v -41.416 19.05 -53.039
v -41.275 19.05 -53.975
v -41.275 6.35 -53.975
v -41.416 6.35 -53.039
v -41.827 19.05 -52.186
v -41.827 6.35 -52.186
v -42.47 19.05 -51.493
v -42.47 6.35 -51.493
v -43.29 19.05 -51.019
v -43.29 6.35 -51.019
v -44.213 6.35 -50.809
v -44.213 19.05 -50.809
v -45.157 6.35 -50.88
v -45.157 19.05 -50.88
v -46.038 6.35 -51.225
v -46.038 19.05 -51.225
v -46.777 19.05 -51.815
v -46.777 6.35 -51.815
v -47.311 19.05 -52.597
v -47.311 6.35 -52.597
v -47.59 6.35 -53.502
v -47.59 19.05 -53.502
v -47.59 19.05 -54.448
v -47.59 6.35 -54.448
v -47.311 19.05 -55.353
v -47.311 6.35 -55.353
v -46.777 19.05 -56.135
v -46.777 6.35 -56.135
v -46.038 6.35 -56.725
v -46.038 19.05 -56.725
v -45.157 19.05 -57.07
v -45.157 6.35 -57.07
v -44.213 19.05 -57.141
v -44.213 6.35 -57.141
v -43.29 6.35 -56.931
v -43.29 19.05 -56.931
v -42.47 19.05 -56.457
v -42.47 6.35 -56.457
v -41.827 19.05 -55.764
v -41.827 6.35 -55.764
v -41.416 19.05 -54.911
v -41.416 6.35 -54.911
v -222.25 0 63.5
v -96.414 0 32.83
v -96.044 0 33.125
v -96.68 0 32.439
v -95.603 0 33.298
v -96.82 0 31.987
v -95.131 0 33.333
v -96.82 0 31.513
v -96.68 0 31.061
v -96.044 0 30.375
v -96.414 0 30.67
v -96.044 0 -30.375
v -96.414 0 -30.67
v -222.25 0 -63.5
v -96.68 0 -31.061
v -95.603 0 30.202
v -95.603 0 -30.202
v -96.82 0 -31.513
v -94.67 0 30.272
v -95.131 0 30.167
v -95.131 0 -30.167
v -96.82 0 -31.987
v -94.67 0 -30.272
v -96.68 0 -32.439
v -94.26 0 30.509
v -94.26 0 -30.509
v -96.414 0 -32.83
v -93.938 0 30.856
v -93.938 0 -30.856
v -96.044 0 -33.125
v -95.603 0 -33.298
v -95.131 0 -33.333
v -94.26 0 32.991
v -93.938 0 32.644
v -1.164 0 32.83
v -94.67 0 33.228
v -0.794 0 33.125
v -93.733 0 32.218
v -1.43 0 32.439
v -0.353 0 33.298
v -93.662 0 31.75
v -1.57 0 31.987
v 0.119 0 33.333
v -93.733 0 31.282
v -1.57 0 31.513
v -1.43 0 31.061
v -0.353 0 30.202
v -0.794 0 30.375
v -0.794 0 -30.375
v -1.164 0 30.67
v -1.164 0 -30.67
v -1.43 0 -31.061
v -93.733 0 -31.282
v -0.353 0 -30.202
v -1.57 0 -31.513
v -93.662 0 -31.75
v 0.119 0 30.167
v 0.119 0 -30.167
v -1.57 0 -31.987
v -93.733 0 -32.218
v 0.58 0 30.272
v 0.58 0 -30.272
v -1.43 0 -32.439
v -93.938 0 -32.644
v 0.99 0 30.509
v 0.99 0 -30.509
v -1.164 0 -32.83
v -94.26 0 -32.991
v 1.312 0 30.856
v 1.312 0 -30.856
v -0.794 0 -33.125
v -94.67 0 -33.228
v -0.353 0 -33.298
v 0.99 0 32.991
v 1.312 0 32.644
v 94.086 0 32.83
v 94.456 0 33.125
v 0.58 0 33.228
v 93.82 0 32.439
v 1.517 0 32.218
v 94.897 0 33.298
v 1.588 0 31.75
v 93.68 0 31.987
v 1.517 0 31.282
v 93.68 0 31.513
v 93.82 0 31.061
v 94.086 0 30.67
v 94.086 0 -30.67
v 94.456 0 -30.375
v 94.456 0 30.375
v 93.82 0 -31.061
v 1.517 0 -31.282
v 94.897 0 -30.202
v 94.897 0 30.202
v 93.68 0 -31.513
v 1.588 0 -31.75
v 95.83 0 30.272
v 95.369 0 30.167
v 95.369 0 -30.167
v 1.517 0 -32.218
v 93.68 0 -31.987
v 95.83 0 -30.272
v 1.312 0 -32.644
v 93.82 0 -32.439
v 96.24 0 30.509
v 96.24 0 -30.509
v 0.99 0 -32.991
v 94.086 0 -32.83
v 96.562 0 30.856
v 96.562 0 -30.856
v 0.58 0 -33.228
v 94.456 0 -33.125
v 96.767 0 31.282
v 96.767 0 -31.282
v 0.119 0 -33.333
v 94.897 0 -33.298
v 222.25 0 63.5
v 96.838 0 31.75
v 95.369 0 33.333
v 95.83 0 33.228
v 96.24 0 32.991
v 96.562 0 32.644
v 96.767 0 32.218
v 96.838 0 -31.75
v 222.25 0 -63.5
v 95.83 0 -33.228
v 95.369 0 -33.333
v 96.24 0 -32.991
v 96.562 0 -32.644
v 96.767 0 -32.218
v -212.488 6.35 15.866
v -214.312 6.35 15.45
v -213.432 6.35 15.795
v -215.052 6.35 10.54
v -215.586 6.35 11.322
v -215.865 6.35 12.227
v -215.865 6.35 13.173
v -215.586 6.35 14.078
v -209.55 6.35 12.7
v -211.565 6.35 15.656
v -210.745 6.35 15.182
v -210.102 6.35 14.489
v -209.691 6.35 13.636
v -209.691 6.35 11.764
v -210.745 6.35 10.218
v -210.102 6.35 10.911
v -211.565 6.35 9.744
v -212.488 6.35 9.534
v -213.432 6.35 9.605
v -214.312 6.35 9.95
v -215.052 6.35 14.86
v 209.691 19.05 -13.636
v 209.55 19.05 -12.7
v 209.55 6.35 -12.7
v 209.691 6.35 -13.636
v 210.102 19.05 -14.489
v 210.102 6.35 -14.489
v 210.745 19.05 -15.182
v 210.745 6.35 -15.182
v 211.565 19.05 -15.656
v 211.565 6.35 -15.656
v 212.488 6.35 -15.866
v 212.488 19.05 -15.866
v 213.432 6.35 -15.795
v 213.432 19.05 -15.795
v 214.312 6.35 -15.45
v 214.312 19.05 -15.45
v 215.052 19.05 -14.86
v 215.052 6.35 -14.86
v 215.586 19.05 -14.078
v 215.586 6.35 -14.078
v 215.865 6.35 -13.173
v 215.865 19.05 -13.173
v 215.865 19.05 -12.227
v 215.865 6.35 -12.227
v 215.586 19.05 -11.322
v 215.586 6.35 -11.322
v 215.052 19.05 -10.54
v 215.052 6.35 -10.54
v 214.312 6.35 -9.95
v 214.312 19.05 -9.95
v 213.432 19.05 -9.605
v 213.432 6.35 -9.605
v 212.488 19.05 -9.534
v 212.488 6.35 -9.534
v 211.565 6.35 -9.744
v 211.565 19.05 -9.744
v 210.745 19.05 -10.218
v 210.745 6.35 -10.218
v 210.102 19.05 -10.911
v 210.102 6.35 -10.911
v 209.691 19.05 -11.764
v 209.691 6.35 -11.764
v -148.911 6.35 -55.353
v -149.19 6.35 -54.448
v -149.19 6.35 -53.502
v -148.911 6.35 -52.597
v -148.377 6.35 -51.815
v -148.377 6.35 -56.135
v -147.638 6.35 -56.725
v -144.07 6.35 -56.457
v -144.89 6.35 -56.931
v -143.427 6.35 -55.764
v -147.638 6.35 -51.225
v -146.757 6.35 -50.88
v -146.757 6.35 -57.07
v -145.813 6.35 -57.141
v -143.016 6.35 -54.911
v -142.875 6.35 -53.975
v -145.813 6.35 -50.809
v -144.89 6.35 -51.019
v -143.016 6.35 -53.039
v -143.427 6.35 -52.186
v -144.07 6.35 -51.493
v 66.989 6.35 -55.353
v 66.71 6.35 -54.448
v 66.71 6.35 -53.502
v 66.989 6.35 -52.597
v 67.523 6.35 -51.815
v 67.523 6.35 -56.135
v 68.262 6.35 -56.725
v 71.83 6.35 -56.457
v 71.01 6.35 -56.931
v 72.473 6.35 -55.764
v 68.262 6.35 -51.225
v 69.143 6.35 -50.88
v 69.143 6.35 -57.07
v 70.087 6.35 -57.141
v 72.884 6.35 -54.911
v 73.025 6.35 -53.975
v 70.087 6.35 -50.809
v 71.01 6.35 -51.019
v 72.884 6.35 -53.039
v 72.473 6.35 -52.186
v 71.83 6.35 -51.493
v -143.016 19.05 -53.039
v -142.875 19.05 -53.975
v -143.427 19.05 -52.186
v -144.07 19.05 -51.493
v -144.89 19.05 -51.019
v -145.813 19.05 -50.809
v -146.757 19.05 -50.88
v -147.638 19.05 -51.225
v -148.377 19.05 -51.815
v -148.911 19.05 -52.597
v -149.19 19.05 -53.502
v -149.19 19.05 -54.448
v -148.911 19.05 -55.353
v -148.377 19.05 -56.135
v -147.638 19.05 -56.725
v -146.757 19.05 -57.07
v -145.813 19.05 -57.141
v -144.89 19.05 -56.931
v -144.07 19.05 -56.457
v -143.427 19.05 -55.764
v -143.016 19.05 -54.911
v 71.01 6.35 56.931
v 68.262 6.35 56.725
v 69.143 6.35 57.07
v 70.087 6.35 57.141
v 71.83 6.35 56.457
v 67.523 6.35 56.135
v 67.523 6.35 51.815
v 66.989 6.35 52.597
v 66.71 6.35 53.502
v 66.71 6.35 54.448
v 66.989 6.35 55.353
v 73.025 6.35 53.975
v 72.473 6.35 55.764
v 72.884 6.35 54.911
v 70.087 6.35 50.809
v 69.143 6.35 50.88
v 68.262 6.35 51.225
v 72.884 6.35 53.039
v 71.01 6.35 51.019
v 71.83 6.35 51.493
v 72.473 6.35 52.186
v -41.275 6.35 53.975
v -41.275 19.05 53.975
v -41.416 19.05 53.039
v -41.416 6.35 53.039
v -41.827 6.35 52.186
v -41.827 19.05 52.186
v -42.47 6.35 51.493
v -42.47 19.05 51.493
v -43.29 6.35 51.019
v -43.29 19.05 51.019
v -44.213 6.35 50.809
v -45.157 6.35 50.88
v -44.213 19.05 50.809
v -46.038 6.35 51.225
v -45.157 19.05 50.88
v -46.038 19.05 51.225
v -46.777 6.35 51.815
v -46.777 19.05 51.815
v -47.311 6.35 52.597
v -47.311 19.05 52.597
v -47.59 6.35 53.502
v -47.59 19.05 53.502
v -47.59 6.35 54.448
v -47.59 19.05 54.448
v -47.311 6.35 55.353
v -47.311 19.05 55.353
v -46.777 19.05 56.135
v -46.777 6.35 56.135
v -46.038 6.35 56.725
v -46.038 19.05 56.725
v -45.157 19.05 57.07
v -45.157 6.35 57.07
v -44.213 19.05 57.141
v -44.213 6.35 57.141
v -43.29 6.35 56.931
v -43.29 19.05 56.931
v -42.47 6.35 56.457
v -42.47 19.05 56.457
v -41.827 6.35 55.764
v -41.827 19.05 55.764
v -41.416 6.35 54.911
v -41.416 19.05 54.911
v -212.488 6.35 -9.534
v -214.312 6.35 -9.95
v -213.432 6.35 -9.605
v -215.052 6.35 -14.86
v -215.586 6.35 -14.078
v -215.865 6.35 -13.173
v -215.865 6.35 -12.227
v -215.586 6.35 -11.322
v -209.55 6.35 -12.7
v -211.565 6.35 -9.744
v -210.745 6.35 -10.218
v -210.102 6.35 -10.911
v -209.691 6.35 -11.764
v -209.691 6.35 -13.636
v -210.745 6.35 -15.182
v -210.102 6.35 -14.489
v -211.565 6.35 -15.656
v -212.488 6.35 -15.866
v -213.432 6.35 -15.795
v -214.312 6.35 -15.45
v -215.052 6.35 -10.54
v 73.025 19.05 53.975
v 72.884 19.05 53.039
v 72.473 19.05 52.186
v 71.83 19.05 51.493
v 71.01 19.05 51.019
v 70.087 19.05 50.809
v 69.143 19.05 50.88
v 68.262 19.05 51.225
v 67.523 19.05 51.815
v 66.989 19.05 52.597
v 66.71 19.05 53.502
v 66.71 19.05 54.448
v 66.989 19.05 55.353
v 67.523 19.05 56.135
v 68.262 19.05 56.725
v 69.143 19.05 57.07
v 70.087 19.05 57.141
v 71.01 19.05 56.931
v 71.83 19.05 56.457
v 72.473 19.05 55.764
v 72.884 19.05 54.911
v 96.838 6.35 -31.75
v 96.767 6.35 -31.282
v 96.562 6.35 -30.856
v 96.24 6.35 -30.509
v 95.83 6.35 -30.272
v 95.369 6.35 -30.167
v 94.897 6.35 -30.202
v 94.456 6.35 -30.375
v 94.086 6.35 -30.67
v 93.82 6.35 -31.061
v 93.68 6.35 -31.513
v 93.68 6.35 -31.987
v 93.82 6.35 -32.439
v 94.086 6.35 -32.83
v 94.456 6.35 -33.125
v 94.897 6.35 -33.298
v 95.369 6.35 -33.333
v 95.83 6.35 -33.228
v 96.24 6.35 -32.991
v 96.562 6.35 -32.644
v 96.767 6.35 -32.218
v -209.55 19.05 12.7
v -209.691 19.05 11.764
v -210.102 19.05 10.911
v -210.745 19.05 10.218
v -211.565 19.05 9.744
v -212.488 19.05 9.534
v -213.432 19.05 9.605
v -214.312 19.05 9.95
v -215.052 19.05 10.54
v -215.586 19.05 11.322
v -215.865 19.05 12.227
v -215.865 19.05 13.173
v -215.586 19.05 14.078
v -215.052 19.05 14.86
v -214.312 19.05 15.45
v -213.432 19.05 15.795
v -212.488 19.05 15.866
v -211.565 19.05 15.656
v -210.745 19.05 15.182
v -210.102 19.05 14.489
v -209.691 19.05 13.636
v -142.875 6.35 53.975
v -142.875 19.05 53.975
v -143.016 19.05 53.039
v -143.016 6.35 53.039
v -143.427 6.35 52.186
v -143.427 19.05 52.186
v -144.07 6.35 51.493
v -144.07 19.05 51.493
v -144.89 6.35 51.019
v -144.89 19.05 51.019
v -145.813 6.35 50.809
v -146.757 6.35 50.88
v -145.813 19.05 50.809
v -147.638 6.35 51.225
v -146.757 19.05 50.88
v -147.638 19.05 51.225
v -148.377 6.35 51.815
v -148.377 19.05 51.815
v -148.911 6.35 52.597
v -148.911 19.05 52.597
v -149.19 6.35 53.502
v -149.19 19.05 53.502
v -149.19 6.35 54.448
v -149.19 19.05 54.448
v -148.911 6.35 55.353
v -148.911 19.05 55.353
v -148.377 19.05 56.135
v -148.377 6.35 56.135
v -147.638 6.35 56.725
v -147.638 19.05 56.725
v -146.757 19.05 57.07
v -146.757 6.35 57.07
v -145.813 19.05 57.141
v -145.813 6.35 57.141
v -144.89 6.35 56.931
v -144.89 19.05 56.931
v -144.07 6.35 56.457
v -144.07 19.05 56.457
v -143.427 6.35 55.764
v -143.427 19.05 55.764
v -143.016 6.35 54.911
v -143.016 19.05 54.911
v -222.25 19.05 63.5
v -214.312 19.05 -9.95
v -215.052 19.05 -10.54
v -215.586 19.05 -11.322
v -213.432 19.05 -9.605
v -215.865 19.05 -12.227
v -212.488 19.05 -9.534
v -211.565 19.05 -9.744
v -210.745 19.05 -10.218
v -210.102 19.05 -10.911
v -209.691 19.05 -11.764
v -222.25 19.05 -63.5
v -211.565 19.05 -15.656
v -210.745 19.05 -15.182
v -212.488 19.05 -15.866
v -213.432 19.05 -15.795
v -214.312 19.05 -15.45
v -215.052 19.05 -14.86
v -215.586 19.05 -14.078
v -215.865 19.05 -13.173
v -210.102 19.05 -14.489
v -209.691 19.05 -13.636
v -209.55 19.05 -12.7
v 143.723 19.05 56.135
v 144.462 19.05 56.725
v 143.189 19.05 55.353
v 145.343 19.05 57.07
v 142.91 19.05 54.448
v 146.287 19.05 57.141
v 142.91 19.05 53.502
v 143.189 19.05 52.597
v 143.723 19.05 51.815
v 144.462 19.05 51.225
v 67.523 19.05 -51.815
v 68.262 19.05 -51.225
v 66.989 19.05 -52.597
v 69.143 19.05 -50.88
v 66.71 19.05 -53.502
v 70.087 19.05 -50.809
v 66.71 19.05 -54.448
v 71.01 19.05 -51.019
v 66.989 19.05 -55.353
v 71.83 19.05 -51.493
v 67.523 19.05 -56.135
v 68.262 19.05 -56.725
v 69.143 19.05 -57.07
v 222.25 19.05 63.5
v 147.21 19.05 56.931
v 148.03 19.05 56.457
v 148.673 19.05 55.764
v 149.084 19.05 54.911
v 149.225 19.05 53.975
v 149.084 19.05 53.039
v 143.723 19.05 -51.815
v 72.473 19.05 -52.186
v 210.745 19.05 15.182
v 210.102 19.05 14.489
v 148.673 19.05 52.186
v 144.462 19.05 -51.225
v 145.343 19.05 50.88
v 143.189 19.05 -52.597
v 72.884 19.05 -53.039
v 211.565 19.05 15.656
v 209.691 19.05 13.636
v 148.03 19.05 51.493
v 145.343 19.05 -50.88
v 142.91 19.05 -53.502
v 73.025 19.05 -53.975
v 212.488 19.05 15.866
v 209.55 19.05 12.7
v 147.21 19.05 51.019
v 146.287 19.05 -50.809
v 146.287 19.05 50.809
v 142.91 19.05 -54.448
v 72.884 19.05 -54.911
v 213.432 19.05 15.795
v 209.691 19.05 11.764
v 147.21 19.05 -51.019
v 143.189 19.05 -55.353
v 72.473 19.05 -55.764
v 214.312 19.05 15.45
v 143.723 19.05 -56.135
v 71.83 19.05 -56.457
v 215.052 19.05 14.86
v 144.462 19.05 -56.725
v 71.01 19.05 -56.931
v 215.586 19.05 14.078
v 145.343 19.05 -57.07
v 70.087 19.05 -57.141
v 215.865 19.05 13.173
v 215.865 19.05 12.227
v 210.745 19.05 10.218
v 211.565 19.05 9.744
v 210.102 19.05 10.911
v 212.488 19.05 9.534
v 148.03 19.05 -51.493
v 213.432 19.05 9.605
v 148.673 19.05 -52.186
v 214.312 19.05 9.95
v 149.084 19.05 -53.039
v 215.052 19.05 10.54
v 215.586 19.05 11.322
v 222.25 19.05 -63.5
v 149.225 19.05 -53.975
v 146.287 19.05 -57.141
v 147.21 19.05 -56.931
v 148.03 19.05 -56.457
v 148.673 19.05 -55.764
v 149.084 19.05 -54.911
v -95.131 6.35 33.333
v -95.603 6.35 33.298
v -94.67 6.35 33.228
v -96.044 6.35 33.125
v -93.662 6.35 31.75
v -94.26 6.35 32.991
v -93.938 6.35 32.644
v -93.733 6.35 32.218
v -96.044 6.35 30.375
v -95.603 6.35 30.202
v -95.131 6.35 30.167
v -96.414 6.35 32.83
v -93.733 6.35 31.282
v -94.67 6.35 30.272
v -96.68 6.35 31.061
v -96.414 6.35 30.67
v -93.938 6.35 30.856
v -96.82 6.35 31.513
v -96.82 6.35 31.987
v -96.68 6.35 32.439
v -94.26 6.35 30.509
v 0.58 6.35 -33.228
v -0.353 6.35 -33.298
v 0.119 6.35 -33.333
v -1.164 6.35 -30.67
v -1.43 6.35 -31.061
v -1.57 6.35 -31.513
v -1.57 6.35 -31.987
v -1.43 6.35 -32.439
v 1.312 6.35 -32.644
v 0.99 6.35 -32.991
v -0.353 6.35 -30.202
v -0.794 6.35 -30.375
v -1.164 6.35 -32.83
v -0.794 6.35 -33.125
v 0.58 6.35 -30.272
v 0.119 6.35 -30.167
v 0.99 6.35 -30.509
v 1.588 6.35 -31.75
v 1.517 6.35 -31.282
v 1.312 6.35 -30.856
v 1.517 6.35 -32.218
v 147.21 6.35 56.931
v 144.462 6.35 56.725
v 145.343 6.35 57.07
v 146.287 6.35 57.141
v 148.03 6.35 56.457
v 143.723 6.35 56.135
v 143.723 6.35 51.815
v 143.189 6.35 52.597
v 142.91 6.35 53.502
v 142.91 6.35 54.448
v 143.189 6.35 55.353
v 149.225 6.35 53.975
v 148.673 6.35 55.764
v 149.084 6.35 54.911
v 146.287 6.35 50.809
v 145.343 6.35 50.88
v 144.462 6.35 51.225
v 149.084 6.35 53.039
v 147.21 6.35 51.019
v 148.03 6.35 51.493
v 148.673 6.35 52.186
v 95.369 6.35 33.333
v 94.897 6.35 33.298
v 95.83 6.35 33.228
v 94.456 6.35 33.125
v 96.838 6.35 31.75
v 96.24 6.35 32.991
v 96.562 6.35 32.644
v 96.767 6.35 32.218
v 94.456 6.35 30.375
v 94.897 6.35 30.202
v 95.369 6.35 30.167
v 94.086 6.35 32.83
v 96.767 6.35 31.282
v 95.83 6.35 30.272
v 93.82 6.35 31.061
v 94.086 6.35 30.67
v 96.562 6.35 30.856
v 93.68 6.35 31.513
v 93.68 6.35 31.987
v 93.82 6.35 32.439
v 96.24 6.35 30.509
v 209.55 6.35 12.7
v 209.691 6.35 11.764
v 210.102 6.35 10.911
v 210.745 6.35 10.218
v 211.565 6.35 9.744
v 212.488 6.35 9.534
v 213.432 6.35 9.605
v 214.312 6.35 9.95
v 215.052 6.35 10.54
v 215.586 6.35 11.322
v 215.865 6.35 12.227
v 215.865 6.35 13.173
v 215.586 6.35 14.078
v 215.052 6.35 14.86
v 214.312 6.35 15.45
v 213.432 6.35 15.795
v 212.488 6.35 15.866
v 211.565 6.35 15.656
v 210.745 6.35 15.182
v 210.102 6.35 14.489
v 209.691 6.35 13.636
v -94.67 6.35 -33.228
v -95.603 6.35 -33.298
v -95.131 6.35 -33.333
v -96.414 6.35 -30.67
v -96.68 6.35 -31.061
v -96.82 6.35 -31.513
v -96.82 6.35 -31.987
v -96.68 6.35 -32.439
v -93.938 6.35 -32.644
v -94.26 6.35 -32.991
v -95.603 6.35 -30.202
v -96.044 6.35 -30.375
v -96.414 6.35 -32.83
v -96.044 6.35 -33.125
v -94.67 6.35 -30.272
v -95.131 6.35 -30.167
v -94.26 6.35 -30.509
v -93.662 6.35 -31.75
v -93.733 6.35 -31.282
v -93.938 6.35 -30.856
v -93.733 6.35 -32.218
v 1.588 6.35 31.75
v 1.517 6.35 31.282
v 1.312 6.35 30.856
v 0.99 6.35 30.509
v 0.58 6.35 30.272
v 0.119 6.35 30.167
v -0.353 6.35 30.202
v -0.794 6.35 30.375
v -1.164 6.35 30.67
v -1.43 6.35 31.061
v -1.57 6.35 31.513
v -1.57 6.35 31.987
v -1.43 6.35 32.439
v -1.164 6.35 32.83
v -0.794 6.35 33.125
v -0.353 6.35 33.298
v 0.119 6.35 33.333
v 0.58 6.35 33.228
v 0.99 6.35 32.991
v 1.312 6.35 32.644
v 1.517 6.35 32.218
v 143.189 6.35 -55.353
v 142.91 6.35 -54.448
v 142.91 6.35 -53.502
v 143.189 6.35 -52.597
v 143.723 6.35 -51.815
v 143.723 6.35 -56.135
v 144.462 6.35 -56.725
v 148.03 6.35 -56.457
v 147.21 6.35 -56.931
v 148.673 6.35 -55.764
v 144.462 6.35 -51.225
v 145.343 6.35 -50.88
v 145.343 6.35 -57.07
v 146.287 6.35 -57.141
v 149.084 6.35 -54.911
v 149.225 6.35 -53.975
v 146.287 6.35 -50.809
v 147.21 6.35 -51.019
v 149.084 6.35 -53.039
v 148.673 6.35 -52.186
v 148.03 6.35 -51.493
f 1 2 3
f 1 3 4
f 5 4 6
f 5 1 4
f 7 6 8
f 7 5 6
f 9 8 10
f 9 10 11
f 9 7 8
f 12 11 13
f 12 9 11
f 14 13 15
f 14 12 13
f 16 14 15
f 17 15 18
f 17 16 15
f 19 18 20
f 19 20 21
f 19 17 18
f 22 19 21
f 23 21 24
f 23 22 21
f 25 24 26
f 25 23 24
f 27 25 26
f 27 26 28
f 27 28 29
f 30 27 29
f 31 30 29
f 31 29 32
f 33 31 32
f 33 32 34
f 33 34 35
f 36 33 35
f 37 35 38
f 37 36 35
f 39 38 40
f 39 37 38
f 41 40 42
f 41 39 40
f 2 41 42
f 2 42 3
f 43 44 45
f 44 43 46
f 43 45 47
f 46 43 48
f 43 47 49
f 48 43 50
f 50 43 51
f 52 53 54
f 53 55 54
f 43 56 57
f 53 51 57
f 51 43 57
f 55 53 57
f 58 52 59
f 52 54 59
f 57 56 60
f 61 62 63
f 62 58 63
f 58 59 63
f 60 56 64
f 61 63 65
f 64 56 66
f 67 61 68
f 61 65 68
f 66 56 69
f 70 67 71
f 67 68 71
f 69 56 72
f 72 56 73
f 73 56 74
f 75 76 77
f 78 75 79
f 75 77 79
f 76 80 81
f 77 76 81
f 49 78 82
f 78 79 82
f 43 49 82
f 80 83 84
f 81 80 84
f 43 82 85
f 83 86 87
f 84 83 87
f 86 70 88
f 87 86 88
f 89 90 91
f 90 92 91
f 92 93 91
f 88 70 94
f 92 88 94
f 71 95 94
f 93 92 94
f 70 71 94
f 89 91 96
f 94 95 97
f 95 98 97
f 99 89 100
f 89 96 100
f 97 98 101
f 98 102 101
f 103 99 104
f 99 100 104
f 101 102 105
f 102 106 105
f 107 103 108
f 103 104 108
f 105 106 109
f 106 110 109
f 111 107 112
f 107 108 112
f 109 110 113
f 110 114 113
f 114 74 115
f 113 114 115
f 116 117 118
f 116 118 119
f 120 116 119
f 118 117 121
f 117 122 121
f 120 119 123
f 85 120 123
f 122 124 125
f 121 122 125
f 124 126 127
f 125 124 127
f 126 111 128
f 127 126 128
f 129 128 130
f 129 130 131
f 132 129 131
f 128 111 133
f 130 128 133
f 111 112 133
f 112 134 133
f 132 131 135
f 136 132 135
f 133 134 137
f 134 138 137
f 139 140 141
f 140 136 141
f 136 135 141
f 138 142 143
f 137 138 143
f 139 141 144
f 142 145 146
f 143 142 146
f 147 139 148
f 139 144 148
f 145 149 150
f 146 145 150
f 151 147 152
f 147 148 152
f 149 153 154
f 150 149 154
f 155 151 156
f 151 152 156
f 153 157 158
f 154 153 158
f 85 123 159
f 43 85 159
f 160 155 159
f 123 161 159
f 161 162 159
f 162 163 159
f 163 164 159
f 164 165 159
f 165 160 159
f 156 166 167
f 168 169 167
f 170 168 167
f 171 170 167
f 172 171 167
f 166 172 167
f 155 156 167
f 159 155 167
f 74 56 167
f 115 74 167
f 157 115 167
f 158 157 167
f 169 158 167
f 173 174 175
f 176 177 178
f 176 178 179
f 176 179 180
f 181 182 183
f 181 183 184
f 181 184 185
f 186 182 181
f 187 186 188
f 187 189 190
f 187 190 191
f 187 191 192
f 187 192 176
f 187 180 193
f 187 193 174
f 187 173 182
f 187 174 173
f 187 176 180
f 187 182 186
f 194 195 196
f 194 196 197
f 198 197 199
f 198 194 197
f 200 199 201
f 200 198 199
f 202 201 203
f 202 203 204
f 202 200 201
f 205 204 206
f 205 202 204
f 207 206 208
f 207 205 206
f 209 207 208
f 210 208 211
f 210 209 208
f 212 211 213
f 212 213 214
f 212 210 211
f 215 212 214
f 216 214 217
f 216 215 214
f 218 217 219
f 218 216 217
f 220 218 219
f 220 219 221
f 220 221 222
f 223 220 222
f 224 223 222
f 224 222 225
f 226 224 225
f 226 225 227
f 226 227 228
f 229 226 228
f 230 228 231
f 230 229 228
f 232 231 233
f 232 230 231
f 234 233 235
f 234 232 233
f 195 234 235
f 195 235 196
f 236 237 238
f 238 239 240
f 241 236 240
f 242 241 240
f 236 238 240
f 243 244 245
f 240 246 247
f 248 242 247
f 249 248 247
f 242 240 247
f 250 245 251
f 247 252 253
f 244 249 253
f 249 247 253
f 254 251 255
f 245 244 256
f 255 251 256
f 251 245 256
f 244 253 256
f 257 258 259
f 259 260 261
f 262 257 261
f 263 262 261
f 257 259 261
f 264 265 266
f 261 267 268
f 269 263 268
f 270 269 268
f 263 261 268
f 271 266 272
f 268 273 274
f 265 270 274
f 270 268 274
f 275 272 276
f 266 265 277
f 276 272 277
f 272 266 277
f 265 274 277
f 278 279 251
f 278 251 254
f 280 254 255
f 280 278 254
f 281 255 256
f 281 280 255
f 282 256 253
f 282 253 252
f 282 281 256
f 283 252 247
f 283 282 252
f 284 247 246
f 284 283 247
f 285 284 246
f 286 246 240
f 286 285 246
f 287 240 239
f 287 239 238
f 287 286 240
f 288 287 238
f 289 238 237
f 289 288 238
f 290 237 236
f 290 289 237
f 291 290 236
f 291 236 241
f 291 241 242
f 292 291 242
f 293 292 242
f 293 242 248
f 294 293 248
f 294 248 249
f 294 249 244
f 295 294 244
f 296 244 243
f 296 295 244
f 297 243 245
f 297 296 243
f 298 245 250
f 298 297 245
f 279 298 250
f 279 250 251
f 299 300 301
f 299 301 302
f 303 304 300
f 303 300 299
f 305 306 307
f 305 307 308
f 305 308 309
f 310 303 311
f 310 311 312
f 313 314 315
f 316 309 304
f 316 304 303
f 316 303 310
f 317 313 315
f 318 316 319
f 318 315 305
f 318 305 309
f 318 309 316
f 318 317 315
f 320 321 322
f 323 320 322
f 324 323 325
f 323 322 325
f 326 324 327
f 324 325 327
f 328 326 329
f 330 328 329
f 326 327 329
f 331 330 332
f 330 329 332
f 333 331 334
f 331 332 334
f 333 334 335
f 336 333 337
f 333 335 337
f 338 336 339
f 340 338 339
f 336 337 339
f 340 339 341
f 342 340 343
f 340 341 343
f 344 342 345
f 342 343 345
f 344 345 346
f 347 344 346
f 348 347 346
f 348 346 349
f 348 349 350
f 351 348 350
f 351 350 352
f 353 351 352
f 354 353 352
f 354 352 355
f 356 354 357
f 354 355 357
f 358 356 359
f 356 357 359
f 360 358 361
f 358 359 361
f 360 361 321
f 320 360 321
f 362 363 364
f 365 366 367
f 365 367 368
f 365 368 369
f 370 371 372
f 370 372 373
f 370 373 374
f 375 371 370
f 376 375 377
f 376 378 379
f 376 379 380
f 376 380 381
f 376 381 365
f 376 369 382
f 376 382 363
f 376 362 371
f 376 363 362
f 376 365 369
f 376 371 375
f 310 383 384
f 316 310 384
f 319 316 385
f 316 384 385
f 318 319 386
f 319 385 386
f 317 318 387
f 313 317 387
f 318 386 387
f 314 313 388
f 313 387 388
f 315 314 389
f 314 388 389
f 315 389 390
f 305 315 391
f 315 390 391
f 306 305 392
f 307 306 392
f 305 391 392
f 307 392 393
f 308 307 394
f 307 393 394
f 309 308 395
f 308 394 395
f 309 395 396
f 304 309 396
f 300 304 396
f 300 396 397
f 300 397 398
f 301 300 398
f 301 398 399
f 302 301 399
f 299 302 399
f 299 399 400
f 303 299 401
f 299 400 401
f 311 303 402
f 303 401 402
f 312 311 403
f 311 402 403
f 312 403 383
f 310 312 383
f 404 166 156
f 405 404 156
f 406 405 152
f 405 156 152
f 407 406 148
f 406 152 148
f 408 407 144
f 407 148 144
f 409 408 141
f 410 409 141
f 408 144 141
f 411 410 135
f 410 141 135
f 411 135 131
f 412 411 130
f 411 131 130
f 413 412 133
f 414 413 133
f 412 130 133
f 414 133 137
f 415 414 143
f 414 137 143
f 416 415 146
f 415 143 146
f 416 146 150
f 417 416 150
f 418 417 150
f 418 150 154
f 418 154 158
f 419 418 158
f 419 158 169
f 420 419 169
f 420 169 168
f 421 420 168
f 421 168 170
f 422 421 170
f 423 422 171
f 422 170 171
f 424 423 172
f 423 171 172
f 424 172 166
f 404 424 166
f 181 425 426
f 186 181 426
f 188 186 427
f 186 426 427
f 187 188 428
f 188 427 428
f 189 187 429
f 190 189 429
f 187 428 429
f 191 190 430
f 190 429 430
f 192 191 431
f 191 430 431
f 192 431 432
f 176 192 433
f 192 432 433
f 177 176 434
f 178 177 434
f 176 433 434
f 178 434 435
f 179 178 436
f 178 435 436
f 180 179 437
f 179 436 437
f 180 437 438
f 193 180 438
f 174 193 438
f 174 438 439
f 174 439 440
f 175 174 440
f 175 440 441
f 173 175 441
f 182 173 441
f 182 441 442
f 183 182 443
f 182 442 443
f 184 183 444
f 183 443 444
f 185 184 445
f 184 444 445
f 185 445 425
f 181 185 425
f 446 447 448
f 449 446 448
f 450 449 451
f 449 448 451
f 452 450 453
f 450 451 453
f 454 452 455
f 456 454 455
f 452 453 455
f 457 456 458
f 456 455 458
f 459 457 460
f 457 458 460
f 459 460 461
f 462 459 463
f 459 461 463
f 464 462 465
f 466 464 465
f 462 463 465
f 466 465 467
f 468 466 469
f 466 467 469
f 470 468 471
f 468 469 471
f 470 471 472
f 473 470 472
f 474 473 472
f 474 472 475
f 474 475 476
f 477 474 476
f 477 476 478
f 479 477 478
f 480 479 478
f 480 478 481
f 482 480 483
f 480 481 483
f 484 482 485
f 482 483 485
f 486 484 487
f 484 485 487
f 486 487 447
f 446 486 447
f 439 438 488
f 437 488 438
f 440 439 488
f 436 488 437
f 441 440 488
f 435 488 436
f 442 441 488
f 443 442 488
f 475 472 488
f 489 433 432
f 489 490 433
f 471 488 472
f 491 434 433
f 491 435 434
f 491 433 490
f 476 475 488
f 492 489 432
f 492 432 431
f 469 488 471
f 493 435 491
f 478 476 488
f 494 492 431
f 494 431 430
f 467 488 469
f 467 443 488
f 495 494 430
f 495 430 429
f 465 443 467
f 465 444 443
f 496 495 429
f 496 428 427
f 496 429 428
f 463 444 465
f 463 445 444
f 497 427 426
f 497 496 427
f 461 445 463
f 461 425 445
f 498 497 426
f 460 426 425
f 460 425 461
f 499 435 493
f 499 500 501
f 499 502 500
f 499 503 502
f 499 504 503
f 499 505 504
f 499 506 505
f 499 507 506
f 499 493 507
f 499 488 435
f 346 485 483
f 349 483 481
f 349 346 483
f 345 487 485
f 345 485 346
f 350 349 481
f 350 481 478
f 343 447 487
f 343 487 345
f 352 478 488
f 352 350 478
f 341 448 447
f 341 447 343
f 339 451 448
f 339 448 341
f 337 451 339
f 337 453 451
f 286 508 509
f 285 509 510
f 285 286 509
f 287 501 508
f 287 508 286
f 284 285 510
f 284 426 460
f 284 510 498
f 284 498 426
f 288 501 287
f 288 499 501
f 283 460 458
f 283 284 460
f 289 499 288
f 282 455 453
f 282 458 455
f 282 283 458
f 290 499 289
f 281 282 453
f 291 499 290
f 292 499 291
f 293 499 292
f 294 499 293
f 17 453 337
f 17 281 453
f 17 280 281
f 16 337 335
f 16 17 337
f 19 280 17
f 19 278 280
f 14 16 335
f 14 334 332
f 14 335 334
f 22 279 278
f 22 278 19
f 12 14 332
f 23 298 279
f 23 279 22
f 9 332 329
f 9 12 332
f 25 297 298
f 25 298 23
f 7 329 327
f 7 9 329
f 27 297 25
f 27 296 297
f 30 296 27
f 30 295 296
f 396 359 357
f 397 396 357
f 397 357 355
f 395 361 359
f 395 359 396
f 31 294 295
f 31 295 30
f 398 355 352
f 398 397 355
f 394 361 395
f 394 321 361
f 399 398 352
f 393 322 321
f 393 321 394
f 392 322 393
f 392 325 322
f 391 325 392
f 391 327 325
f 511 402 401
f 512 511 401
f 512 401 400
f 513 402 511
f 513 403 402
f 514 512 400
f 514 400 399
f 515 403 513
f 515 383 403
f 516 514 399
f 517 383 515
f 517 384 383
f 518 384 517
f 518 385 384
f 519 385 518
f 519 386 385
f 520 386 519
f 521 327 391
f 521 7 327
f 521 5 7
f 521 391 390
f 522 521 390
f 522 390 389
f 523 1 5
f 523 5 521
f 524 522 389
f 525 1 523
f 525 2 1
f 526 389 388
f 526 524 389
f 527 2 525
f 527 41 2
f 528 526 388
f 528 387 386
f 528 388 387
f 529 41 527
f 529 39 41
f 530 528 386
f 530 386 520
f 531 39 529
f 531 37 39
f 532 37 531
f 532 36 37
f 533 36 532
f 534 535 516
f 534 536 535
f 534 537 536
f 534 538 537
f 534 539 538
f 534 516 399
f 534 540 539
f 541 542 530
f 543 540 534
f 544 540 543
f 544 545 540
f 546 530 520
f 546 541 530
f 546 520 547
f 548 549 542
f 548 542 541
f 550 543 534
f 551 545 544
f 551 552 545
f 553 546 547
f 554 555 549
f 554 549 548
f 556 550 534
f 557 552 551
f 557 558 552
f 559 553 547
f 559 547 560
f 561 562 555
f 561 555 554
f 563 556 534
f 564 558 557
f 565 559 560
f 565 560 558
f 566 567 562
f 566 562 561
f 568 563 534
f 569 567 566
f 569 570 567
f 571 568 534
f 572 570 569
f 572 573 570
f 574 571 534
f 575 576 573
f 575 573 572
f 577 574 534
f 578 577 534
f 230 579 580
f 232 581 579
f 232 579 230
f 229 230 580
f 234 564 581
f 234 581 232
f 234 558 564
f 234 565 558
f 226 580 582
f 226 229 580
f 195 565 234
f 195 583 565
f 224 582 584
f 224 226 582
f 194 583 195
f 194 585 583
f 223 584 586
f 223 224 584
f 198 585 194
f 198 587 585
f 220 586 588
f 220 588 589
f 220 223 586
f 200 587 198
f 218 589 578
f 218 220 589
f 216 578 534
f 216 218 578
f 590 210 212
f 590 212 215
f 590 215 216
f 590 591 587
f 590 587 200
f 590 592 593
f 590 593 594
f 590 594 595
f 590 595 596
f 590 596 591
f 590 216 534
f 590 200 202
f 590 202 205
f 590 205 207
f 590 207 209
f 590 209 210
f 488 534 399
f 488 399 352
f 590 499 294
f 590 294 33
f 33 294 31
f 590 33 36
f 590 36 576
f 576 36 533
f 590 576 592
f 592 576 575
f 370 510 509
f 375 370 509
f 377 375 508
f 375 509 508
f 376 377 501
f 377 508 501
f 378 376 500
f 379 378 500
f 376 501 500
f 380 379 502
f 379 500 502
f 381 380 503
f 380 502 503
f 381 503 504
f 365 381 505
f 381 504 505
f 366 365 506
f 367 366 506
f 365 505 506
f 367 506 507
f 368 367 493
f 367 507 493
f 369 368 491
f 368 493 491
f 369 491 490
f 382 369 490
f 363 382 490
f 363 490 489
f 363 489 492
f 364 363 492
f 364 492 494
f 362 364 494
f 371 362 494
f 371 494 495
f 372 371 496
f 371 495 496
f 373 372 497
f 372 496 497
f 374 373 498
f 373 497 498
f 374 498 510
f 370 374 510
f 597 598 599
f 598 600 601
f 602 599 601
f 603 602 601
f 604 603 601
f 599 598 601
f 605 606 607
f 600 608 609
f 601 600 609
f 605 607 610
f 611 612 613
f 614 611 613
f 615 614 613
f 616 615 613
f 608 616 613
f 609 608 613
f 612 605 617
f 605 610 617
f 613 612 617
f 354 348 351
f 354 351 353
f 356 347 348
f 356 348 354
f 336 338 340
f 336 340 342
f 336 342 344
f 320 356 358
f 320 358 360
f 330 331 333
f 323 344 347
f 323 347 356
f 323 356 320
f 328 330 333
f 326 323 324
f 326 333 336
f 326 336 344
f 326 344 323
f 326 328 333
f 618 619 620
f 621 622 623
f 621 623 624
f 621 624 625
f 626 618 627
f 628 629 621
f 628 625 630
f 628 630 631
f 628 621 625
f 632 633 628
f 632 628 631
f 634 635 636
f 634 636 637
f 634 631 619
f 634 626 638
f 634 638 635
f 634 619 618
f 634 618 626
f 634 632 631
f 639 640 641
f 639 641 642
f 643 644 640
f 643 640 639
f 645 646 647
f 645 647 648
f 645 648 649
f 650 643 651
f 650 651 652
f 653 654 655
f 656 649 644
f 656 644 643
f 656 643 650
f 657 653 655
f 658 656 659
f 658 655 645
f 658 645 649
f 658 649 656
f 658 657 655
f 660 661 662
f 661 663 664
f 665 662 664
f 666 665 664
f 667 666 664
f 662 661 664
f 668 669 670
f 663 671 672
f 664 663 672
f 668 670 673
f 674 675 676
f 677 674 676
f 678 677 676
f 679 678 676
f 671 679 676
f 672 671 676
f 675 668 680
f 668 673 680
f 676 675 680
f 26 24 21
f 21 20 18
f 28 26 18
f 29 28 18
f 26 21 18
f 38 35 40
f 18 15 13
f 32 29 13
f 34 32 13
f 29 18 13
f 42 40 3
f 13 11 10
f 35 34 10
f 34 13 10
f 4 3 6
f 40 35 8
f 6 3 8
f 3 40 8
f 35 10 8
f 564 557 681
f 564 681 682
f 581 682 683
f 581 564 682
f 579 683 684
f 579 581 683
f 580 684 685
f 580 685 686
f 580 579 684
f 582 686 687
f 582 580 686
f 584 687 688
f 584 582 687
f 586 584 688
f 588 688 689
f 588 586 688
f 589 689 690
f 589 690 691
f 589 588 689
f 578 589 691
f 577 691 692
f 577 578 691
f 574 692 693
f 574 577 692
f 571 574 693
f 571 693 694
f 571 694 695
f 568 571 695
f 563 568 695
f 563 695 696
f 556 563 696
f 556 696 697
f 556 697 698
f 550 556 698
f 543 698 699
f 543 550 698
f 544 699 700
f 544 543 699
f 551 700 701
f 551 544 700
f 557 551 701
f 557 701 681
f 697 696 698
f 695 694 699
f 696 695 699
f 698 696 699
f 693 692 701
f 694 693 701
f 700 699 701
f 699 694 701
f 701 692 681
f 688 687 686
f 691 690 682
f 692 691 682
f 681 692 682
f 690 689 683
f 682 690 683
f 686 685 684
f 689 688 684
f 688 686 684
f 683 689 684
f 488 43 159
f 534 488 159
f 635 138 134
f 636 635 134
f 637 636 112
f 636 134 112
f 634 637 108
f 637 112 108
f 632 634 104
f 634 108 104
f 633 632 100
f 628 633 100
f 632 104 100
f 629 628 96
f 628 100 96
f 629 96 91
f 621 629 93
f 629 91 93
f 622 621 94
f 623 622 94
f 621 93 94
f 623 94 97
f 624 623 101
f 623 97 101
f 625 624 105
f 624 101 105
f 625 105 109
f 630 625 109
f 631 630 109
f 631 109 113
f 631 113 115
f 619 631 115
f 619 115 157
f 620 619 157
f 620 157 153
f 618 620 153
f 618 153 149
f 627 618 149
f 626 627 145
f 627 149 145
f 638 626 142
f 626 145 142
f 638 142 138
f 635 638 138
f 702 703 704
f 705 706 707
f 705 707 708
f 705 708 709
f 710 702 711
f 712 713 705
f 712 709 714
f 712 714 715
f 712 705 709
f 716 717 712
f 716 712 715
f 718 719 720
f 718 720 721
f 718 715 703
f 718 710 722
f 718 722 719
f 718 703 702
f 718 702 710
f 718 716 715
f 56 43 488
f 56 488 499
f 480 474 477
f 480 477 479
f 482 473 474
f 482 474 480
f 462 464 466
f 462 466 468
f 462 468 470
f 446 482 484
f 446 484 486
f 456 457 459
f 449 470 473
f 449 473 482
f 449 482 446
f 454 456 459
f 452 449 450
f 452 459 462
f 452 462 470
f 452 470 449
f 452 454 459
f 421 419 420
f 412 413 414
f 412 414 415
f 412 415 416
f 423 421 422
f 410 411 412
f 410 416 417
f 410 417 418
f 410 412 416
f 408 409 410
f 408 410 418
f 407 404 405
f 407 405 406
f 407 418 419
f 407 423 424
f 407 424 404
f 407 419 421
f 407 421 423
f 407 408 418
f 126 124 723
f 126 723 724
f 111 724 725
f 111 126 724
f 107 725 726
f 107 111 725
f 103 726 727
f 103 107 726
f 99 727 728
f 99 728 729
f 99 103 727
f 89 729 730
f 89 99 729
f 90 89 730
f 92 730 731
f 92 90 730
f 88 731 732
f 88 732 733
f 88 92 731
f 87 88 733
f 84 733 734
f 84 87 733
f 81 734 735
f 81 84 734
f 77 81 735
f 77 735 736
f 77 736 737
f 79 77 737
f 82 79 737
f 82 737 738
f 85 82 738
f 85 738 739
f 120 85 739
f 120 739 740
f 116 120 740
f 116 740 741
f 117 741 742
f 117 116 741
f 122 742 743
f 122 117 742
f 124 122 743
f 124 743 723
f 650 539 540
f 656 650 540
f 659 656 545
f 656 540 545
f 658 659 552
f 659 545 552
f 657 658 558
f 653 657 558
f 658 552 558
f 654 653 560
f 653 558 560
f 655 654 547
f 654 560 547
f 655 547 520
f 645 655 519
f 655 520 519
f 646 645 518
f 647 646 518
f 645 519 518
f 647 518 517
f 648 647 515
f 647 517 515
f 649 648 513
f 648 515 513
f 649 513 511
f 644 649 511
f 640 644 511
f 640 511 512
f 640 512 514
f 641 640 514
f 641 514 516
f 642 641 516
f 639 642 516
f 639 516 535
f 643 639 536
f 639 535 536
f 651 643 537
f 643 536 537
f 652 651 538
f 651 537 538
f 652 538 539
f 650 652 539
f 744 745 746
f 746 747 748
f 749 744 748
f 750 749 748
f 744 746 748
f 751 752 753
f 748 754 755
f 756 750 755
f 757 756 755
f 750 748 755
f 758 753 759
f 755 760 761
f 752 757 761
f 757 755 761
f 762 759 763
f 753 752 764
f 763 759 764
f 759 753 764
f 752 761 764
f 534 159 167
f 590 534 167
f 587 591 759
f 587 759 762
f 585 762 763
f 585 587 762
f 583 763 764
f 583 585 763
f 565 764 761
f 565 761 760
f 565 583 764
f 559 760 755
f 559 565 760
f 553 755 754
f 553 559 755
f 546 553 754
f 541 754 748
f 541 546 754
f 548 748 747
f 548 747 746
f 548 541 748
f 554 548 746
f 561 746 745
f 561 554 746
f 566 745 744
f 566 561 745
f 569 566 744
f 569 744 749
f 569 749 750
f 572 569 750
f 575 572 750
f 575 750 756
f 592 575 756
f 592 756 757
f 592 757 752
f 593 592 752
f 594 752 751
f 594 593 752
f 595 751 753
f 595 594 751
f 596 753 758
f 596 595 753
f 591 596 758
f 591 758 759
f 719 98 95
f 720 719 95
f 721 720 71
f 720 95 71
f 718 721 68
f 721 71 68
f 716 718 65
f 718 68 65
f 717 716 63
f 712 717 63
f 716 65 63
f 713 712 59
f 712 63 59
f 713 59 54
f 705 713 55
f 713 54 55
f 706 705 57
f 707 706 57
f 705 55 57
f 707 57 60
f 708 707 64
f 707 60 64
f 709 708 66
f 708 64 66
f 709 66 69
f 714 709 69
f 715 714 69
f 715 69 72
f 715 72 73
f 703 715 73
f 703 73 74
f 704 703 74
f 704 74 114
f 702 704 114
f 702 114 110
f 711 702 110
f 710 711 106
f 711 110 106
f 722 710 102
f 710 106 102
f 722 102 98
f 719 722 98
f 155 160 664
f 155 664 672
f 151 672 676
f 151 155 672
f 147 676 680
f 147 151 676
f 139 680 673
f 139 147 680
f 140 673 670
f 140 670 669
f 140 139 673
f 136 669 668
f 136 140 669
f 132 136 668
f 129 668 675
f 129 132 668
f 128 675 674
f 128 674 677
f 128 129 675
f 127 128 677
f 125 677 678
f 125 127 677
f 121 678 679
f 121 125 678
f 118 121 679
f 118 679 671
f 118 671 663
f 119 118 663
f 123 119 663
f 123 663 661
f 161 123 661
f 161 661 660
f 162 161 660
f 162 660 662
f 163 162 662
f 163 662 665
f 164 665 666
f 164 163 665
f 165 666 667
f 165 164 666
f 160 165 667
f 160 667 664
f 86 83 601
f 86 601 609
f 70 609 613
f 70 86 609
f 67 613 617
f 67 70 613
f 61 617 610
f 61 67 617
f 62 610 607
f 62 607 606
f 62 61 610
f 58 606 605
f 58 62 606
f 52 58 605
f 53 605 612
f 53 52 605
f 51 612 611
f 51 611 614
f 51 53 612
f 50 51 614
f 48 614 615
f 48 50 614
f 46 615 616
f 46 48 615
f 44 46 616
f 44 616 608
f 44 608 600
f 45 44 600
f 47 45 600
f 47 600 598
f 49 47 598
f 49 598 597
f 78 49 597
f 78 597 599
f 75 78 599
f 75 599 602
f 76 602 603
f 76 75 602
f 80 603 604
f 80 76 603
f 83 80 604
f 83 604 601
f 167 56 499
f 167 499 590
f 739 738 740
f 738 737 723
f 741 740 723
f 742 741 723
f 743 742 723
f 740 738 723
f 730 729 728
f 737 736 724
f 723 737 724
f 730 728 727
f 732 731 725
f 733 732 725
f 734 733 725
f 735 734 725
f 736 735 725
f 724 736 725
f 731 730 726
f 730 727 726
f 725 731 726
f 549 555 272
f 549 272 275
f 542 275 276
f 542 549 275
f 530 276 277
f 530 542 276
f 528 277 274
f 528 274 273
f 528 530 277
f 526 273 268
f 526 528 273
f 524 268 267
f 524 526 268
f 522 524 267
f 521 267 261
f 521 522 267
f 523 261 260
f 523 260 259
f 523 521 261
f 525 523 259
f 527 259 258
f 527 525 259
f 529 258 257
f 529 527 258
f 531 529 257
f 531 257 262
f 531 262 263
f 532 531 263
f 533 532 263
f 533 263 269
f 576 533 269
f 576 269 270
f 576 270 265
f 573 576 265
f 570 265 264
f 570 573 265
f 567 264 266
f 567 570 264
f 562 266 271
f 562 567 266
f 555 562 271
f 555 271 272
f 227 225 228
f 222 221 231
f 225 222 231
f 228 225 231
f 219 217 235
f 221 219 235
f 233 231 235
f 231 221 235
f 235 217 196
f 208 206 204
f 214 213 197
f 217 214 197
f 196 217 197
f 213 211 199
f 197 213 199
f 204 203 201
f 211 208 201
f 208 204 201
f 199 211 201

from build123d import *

# Parameters (mm, degrees)
SKETCH1_W           = 444.5
SKETCH1_H           = 127
BOSS_EXTRUDE1_DEPTH = 19.05
SKETCH2_R           = 3.175
CUT_EXTRUDE1_DEPTH  = 12.7
SKETCH3_R           = 3.175
CUT_EXTRUDE2_DEPTH  = 12.7
SKETCH4_R           = 1.5875
CUT_EXTRUDE3_DEPTH  = 6.35


with BuildPart() as part:
    # Sketch1 → Boss-Extrude1 (new body)
    with BuildSketch(Plane(origin=(0, 0, 0), x_dir=(1, 0, 0), z_dir=(0, 1, 0))):
        Rectangle(SKETCH1_W, SKETCH1_H)
    extrude(amount=BOSS_EXTRUDE1_DEPTH)

    # Sketch2 → Cut-Extrude1 (cut)
    with BuildSketch(Plane(origin=(0, 19.05, 0), x_dir=(1, 0, 0), z_dir=(0, 1, 0))):
        with Locations((-146.05, -53.975)):
            Circle(SKETCH2_R)
        with Locations((-44.45, -53.975)):
            Circle(SKETCH2_R)
        with Locations((69.85, -53.975)):
            Circle(SKETCH2_R)
        with Locations((146.05, -53.975)):
            Circle(SKETCH2_R)
    cut_extrude1 = extrude(amount=-CUT_EXTRUDE1_DEPTH, mode=Mode.SUBTRACT)

    # Mirror1: Cut-Extrude1 across plane
    add(cut_extrude1.mirror(Plane.XY), mode=Mode.SUBTRACT)

    # Sketch3 → Cut-Extrude2 (cut)
    with BuildSketch(Plane(origin=(0, 19.05, 0), x_dir=(1, 0, 0), z_dir=(0, 1, 0))):
        with Locations((-212.725, 12.7)):
            Circle(SKETCH3_R)
        with Locations((-212.725, -12.7)):
            Circle(SKETCH3_R)
    cut_extrude2 = extrude(amount=-CUT_EXTRUDE2_DEPTH, mode=Mode.SUBTRACT)

    # Mirror3: Cut-Extrude2 across plane
    add(cut_extrude2.mirror(Plane(origin=(0, 0, 0), x_dir=(0, 0, 1), z_dir=(1, 0, 0))), mode=Mode.SUBTRACT)

    # Sketch4 → Cut-Extrude3 (cut)
    with BuildSketch(Plane.XZ):
        with Locations((-95.25, -31.75)):
            Circle(SKETCH4_R)
        with Locations((0, -31.75)):
            Circle(SKETCH4_R)
        with Locations((95.25, -31.75)):
            Circle(SKETCH4_R)
    cut_extrude3 = extrude(amount=-CUT_EXTRUDE3_DEPTH, mode=Mode.SUBTRACT)

    # Mirror4: Cut-Extrude3 across plane
    add(cut_extrude3.mirror(Plane.XY), mode=Mode.SUBTRACT)


solid = part.part
